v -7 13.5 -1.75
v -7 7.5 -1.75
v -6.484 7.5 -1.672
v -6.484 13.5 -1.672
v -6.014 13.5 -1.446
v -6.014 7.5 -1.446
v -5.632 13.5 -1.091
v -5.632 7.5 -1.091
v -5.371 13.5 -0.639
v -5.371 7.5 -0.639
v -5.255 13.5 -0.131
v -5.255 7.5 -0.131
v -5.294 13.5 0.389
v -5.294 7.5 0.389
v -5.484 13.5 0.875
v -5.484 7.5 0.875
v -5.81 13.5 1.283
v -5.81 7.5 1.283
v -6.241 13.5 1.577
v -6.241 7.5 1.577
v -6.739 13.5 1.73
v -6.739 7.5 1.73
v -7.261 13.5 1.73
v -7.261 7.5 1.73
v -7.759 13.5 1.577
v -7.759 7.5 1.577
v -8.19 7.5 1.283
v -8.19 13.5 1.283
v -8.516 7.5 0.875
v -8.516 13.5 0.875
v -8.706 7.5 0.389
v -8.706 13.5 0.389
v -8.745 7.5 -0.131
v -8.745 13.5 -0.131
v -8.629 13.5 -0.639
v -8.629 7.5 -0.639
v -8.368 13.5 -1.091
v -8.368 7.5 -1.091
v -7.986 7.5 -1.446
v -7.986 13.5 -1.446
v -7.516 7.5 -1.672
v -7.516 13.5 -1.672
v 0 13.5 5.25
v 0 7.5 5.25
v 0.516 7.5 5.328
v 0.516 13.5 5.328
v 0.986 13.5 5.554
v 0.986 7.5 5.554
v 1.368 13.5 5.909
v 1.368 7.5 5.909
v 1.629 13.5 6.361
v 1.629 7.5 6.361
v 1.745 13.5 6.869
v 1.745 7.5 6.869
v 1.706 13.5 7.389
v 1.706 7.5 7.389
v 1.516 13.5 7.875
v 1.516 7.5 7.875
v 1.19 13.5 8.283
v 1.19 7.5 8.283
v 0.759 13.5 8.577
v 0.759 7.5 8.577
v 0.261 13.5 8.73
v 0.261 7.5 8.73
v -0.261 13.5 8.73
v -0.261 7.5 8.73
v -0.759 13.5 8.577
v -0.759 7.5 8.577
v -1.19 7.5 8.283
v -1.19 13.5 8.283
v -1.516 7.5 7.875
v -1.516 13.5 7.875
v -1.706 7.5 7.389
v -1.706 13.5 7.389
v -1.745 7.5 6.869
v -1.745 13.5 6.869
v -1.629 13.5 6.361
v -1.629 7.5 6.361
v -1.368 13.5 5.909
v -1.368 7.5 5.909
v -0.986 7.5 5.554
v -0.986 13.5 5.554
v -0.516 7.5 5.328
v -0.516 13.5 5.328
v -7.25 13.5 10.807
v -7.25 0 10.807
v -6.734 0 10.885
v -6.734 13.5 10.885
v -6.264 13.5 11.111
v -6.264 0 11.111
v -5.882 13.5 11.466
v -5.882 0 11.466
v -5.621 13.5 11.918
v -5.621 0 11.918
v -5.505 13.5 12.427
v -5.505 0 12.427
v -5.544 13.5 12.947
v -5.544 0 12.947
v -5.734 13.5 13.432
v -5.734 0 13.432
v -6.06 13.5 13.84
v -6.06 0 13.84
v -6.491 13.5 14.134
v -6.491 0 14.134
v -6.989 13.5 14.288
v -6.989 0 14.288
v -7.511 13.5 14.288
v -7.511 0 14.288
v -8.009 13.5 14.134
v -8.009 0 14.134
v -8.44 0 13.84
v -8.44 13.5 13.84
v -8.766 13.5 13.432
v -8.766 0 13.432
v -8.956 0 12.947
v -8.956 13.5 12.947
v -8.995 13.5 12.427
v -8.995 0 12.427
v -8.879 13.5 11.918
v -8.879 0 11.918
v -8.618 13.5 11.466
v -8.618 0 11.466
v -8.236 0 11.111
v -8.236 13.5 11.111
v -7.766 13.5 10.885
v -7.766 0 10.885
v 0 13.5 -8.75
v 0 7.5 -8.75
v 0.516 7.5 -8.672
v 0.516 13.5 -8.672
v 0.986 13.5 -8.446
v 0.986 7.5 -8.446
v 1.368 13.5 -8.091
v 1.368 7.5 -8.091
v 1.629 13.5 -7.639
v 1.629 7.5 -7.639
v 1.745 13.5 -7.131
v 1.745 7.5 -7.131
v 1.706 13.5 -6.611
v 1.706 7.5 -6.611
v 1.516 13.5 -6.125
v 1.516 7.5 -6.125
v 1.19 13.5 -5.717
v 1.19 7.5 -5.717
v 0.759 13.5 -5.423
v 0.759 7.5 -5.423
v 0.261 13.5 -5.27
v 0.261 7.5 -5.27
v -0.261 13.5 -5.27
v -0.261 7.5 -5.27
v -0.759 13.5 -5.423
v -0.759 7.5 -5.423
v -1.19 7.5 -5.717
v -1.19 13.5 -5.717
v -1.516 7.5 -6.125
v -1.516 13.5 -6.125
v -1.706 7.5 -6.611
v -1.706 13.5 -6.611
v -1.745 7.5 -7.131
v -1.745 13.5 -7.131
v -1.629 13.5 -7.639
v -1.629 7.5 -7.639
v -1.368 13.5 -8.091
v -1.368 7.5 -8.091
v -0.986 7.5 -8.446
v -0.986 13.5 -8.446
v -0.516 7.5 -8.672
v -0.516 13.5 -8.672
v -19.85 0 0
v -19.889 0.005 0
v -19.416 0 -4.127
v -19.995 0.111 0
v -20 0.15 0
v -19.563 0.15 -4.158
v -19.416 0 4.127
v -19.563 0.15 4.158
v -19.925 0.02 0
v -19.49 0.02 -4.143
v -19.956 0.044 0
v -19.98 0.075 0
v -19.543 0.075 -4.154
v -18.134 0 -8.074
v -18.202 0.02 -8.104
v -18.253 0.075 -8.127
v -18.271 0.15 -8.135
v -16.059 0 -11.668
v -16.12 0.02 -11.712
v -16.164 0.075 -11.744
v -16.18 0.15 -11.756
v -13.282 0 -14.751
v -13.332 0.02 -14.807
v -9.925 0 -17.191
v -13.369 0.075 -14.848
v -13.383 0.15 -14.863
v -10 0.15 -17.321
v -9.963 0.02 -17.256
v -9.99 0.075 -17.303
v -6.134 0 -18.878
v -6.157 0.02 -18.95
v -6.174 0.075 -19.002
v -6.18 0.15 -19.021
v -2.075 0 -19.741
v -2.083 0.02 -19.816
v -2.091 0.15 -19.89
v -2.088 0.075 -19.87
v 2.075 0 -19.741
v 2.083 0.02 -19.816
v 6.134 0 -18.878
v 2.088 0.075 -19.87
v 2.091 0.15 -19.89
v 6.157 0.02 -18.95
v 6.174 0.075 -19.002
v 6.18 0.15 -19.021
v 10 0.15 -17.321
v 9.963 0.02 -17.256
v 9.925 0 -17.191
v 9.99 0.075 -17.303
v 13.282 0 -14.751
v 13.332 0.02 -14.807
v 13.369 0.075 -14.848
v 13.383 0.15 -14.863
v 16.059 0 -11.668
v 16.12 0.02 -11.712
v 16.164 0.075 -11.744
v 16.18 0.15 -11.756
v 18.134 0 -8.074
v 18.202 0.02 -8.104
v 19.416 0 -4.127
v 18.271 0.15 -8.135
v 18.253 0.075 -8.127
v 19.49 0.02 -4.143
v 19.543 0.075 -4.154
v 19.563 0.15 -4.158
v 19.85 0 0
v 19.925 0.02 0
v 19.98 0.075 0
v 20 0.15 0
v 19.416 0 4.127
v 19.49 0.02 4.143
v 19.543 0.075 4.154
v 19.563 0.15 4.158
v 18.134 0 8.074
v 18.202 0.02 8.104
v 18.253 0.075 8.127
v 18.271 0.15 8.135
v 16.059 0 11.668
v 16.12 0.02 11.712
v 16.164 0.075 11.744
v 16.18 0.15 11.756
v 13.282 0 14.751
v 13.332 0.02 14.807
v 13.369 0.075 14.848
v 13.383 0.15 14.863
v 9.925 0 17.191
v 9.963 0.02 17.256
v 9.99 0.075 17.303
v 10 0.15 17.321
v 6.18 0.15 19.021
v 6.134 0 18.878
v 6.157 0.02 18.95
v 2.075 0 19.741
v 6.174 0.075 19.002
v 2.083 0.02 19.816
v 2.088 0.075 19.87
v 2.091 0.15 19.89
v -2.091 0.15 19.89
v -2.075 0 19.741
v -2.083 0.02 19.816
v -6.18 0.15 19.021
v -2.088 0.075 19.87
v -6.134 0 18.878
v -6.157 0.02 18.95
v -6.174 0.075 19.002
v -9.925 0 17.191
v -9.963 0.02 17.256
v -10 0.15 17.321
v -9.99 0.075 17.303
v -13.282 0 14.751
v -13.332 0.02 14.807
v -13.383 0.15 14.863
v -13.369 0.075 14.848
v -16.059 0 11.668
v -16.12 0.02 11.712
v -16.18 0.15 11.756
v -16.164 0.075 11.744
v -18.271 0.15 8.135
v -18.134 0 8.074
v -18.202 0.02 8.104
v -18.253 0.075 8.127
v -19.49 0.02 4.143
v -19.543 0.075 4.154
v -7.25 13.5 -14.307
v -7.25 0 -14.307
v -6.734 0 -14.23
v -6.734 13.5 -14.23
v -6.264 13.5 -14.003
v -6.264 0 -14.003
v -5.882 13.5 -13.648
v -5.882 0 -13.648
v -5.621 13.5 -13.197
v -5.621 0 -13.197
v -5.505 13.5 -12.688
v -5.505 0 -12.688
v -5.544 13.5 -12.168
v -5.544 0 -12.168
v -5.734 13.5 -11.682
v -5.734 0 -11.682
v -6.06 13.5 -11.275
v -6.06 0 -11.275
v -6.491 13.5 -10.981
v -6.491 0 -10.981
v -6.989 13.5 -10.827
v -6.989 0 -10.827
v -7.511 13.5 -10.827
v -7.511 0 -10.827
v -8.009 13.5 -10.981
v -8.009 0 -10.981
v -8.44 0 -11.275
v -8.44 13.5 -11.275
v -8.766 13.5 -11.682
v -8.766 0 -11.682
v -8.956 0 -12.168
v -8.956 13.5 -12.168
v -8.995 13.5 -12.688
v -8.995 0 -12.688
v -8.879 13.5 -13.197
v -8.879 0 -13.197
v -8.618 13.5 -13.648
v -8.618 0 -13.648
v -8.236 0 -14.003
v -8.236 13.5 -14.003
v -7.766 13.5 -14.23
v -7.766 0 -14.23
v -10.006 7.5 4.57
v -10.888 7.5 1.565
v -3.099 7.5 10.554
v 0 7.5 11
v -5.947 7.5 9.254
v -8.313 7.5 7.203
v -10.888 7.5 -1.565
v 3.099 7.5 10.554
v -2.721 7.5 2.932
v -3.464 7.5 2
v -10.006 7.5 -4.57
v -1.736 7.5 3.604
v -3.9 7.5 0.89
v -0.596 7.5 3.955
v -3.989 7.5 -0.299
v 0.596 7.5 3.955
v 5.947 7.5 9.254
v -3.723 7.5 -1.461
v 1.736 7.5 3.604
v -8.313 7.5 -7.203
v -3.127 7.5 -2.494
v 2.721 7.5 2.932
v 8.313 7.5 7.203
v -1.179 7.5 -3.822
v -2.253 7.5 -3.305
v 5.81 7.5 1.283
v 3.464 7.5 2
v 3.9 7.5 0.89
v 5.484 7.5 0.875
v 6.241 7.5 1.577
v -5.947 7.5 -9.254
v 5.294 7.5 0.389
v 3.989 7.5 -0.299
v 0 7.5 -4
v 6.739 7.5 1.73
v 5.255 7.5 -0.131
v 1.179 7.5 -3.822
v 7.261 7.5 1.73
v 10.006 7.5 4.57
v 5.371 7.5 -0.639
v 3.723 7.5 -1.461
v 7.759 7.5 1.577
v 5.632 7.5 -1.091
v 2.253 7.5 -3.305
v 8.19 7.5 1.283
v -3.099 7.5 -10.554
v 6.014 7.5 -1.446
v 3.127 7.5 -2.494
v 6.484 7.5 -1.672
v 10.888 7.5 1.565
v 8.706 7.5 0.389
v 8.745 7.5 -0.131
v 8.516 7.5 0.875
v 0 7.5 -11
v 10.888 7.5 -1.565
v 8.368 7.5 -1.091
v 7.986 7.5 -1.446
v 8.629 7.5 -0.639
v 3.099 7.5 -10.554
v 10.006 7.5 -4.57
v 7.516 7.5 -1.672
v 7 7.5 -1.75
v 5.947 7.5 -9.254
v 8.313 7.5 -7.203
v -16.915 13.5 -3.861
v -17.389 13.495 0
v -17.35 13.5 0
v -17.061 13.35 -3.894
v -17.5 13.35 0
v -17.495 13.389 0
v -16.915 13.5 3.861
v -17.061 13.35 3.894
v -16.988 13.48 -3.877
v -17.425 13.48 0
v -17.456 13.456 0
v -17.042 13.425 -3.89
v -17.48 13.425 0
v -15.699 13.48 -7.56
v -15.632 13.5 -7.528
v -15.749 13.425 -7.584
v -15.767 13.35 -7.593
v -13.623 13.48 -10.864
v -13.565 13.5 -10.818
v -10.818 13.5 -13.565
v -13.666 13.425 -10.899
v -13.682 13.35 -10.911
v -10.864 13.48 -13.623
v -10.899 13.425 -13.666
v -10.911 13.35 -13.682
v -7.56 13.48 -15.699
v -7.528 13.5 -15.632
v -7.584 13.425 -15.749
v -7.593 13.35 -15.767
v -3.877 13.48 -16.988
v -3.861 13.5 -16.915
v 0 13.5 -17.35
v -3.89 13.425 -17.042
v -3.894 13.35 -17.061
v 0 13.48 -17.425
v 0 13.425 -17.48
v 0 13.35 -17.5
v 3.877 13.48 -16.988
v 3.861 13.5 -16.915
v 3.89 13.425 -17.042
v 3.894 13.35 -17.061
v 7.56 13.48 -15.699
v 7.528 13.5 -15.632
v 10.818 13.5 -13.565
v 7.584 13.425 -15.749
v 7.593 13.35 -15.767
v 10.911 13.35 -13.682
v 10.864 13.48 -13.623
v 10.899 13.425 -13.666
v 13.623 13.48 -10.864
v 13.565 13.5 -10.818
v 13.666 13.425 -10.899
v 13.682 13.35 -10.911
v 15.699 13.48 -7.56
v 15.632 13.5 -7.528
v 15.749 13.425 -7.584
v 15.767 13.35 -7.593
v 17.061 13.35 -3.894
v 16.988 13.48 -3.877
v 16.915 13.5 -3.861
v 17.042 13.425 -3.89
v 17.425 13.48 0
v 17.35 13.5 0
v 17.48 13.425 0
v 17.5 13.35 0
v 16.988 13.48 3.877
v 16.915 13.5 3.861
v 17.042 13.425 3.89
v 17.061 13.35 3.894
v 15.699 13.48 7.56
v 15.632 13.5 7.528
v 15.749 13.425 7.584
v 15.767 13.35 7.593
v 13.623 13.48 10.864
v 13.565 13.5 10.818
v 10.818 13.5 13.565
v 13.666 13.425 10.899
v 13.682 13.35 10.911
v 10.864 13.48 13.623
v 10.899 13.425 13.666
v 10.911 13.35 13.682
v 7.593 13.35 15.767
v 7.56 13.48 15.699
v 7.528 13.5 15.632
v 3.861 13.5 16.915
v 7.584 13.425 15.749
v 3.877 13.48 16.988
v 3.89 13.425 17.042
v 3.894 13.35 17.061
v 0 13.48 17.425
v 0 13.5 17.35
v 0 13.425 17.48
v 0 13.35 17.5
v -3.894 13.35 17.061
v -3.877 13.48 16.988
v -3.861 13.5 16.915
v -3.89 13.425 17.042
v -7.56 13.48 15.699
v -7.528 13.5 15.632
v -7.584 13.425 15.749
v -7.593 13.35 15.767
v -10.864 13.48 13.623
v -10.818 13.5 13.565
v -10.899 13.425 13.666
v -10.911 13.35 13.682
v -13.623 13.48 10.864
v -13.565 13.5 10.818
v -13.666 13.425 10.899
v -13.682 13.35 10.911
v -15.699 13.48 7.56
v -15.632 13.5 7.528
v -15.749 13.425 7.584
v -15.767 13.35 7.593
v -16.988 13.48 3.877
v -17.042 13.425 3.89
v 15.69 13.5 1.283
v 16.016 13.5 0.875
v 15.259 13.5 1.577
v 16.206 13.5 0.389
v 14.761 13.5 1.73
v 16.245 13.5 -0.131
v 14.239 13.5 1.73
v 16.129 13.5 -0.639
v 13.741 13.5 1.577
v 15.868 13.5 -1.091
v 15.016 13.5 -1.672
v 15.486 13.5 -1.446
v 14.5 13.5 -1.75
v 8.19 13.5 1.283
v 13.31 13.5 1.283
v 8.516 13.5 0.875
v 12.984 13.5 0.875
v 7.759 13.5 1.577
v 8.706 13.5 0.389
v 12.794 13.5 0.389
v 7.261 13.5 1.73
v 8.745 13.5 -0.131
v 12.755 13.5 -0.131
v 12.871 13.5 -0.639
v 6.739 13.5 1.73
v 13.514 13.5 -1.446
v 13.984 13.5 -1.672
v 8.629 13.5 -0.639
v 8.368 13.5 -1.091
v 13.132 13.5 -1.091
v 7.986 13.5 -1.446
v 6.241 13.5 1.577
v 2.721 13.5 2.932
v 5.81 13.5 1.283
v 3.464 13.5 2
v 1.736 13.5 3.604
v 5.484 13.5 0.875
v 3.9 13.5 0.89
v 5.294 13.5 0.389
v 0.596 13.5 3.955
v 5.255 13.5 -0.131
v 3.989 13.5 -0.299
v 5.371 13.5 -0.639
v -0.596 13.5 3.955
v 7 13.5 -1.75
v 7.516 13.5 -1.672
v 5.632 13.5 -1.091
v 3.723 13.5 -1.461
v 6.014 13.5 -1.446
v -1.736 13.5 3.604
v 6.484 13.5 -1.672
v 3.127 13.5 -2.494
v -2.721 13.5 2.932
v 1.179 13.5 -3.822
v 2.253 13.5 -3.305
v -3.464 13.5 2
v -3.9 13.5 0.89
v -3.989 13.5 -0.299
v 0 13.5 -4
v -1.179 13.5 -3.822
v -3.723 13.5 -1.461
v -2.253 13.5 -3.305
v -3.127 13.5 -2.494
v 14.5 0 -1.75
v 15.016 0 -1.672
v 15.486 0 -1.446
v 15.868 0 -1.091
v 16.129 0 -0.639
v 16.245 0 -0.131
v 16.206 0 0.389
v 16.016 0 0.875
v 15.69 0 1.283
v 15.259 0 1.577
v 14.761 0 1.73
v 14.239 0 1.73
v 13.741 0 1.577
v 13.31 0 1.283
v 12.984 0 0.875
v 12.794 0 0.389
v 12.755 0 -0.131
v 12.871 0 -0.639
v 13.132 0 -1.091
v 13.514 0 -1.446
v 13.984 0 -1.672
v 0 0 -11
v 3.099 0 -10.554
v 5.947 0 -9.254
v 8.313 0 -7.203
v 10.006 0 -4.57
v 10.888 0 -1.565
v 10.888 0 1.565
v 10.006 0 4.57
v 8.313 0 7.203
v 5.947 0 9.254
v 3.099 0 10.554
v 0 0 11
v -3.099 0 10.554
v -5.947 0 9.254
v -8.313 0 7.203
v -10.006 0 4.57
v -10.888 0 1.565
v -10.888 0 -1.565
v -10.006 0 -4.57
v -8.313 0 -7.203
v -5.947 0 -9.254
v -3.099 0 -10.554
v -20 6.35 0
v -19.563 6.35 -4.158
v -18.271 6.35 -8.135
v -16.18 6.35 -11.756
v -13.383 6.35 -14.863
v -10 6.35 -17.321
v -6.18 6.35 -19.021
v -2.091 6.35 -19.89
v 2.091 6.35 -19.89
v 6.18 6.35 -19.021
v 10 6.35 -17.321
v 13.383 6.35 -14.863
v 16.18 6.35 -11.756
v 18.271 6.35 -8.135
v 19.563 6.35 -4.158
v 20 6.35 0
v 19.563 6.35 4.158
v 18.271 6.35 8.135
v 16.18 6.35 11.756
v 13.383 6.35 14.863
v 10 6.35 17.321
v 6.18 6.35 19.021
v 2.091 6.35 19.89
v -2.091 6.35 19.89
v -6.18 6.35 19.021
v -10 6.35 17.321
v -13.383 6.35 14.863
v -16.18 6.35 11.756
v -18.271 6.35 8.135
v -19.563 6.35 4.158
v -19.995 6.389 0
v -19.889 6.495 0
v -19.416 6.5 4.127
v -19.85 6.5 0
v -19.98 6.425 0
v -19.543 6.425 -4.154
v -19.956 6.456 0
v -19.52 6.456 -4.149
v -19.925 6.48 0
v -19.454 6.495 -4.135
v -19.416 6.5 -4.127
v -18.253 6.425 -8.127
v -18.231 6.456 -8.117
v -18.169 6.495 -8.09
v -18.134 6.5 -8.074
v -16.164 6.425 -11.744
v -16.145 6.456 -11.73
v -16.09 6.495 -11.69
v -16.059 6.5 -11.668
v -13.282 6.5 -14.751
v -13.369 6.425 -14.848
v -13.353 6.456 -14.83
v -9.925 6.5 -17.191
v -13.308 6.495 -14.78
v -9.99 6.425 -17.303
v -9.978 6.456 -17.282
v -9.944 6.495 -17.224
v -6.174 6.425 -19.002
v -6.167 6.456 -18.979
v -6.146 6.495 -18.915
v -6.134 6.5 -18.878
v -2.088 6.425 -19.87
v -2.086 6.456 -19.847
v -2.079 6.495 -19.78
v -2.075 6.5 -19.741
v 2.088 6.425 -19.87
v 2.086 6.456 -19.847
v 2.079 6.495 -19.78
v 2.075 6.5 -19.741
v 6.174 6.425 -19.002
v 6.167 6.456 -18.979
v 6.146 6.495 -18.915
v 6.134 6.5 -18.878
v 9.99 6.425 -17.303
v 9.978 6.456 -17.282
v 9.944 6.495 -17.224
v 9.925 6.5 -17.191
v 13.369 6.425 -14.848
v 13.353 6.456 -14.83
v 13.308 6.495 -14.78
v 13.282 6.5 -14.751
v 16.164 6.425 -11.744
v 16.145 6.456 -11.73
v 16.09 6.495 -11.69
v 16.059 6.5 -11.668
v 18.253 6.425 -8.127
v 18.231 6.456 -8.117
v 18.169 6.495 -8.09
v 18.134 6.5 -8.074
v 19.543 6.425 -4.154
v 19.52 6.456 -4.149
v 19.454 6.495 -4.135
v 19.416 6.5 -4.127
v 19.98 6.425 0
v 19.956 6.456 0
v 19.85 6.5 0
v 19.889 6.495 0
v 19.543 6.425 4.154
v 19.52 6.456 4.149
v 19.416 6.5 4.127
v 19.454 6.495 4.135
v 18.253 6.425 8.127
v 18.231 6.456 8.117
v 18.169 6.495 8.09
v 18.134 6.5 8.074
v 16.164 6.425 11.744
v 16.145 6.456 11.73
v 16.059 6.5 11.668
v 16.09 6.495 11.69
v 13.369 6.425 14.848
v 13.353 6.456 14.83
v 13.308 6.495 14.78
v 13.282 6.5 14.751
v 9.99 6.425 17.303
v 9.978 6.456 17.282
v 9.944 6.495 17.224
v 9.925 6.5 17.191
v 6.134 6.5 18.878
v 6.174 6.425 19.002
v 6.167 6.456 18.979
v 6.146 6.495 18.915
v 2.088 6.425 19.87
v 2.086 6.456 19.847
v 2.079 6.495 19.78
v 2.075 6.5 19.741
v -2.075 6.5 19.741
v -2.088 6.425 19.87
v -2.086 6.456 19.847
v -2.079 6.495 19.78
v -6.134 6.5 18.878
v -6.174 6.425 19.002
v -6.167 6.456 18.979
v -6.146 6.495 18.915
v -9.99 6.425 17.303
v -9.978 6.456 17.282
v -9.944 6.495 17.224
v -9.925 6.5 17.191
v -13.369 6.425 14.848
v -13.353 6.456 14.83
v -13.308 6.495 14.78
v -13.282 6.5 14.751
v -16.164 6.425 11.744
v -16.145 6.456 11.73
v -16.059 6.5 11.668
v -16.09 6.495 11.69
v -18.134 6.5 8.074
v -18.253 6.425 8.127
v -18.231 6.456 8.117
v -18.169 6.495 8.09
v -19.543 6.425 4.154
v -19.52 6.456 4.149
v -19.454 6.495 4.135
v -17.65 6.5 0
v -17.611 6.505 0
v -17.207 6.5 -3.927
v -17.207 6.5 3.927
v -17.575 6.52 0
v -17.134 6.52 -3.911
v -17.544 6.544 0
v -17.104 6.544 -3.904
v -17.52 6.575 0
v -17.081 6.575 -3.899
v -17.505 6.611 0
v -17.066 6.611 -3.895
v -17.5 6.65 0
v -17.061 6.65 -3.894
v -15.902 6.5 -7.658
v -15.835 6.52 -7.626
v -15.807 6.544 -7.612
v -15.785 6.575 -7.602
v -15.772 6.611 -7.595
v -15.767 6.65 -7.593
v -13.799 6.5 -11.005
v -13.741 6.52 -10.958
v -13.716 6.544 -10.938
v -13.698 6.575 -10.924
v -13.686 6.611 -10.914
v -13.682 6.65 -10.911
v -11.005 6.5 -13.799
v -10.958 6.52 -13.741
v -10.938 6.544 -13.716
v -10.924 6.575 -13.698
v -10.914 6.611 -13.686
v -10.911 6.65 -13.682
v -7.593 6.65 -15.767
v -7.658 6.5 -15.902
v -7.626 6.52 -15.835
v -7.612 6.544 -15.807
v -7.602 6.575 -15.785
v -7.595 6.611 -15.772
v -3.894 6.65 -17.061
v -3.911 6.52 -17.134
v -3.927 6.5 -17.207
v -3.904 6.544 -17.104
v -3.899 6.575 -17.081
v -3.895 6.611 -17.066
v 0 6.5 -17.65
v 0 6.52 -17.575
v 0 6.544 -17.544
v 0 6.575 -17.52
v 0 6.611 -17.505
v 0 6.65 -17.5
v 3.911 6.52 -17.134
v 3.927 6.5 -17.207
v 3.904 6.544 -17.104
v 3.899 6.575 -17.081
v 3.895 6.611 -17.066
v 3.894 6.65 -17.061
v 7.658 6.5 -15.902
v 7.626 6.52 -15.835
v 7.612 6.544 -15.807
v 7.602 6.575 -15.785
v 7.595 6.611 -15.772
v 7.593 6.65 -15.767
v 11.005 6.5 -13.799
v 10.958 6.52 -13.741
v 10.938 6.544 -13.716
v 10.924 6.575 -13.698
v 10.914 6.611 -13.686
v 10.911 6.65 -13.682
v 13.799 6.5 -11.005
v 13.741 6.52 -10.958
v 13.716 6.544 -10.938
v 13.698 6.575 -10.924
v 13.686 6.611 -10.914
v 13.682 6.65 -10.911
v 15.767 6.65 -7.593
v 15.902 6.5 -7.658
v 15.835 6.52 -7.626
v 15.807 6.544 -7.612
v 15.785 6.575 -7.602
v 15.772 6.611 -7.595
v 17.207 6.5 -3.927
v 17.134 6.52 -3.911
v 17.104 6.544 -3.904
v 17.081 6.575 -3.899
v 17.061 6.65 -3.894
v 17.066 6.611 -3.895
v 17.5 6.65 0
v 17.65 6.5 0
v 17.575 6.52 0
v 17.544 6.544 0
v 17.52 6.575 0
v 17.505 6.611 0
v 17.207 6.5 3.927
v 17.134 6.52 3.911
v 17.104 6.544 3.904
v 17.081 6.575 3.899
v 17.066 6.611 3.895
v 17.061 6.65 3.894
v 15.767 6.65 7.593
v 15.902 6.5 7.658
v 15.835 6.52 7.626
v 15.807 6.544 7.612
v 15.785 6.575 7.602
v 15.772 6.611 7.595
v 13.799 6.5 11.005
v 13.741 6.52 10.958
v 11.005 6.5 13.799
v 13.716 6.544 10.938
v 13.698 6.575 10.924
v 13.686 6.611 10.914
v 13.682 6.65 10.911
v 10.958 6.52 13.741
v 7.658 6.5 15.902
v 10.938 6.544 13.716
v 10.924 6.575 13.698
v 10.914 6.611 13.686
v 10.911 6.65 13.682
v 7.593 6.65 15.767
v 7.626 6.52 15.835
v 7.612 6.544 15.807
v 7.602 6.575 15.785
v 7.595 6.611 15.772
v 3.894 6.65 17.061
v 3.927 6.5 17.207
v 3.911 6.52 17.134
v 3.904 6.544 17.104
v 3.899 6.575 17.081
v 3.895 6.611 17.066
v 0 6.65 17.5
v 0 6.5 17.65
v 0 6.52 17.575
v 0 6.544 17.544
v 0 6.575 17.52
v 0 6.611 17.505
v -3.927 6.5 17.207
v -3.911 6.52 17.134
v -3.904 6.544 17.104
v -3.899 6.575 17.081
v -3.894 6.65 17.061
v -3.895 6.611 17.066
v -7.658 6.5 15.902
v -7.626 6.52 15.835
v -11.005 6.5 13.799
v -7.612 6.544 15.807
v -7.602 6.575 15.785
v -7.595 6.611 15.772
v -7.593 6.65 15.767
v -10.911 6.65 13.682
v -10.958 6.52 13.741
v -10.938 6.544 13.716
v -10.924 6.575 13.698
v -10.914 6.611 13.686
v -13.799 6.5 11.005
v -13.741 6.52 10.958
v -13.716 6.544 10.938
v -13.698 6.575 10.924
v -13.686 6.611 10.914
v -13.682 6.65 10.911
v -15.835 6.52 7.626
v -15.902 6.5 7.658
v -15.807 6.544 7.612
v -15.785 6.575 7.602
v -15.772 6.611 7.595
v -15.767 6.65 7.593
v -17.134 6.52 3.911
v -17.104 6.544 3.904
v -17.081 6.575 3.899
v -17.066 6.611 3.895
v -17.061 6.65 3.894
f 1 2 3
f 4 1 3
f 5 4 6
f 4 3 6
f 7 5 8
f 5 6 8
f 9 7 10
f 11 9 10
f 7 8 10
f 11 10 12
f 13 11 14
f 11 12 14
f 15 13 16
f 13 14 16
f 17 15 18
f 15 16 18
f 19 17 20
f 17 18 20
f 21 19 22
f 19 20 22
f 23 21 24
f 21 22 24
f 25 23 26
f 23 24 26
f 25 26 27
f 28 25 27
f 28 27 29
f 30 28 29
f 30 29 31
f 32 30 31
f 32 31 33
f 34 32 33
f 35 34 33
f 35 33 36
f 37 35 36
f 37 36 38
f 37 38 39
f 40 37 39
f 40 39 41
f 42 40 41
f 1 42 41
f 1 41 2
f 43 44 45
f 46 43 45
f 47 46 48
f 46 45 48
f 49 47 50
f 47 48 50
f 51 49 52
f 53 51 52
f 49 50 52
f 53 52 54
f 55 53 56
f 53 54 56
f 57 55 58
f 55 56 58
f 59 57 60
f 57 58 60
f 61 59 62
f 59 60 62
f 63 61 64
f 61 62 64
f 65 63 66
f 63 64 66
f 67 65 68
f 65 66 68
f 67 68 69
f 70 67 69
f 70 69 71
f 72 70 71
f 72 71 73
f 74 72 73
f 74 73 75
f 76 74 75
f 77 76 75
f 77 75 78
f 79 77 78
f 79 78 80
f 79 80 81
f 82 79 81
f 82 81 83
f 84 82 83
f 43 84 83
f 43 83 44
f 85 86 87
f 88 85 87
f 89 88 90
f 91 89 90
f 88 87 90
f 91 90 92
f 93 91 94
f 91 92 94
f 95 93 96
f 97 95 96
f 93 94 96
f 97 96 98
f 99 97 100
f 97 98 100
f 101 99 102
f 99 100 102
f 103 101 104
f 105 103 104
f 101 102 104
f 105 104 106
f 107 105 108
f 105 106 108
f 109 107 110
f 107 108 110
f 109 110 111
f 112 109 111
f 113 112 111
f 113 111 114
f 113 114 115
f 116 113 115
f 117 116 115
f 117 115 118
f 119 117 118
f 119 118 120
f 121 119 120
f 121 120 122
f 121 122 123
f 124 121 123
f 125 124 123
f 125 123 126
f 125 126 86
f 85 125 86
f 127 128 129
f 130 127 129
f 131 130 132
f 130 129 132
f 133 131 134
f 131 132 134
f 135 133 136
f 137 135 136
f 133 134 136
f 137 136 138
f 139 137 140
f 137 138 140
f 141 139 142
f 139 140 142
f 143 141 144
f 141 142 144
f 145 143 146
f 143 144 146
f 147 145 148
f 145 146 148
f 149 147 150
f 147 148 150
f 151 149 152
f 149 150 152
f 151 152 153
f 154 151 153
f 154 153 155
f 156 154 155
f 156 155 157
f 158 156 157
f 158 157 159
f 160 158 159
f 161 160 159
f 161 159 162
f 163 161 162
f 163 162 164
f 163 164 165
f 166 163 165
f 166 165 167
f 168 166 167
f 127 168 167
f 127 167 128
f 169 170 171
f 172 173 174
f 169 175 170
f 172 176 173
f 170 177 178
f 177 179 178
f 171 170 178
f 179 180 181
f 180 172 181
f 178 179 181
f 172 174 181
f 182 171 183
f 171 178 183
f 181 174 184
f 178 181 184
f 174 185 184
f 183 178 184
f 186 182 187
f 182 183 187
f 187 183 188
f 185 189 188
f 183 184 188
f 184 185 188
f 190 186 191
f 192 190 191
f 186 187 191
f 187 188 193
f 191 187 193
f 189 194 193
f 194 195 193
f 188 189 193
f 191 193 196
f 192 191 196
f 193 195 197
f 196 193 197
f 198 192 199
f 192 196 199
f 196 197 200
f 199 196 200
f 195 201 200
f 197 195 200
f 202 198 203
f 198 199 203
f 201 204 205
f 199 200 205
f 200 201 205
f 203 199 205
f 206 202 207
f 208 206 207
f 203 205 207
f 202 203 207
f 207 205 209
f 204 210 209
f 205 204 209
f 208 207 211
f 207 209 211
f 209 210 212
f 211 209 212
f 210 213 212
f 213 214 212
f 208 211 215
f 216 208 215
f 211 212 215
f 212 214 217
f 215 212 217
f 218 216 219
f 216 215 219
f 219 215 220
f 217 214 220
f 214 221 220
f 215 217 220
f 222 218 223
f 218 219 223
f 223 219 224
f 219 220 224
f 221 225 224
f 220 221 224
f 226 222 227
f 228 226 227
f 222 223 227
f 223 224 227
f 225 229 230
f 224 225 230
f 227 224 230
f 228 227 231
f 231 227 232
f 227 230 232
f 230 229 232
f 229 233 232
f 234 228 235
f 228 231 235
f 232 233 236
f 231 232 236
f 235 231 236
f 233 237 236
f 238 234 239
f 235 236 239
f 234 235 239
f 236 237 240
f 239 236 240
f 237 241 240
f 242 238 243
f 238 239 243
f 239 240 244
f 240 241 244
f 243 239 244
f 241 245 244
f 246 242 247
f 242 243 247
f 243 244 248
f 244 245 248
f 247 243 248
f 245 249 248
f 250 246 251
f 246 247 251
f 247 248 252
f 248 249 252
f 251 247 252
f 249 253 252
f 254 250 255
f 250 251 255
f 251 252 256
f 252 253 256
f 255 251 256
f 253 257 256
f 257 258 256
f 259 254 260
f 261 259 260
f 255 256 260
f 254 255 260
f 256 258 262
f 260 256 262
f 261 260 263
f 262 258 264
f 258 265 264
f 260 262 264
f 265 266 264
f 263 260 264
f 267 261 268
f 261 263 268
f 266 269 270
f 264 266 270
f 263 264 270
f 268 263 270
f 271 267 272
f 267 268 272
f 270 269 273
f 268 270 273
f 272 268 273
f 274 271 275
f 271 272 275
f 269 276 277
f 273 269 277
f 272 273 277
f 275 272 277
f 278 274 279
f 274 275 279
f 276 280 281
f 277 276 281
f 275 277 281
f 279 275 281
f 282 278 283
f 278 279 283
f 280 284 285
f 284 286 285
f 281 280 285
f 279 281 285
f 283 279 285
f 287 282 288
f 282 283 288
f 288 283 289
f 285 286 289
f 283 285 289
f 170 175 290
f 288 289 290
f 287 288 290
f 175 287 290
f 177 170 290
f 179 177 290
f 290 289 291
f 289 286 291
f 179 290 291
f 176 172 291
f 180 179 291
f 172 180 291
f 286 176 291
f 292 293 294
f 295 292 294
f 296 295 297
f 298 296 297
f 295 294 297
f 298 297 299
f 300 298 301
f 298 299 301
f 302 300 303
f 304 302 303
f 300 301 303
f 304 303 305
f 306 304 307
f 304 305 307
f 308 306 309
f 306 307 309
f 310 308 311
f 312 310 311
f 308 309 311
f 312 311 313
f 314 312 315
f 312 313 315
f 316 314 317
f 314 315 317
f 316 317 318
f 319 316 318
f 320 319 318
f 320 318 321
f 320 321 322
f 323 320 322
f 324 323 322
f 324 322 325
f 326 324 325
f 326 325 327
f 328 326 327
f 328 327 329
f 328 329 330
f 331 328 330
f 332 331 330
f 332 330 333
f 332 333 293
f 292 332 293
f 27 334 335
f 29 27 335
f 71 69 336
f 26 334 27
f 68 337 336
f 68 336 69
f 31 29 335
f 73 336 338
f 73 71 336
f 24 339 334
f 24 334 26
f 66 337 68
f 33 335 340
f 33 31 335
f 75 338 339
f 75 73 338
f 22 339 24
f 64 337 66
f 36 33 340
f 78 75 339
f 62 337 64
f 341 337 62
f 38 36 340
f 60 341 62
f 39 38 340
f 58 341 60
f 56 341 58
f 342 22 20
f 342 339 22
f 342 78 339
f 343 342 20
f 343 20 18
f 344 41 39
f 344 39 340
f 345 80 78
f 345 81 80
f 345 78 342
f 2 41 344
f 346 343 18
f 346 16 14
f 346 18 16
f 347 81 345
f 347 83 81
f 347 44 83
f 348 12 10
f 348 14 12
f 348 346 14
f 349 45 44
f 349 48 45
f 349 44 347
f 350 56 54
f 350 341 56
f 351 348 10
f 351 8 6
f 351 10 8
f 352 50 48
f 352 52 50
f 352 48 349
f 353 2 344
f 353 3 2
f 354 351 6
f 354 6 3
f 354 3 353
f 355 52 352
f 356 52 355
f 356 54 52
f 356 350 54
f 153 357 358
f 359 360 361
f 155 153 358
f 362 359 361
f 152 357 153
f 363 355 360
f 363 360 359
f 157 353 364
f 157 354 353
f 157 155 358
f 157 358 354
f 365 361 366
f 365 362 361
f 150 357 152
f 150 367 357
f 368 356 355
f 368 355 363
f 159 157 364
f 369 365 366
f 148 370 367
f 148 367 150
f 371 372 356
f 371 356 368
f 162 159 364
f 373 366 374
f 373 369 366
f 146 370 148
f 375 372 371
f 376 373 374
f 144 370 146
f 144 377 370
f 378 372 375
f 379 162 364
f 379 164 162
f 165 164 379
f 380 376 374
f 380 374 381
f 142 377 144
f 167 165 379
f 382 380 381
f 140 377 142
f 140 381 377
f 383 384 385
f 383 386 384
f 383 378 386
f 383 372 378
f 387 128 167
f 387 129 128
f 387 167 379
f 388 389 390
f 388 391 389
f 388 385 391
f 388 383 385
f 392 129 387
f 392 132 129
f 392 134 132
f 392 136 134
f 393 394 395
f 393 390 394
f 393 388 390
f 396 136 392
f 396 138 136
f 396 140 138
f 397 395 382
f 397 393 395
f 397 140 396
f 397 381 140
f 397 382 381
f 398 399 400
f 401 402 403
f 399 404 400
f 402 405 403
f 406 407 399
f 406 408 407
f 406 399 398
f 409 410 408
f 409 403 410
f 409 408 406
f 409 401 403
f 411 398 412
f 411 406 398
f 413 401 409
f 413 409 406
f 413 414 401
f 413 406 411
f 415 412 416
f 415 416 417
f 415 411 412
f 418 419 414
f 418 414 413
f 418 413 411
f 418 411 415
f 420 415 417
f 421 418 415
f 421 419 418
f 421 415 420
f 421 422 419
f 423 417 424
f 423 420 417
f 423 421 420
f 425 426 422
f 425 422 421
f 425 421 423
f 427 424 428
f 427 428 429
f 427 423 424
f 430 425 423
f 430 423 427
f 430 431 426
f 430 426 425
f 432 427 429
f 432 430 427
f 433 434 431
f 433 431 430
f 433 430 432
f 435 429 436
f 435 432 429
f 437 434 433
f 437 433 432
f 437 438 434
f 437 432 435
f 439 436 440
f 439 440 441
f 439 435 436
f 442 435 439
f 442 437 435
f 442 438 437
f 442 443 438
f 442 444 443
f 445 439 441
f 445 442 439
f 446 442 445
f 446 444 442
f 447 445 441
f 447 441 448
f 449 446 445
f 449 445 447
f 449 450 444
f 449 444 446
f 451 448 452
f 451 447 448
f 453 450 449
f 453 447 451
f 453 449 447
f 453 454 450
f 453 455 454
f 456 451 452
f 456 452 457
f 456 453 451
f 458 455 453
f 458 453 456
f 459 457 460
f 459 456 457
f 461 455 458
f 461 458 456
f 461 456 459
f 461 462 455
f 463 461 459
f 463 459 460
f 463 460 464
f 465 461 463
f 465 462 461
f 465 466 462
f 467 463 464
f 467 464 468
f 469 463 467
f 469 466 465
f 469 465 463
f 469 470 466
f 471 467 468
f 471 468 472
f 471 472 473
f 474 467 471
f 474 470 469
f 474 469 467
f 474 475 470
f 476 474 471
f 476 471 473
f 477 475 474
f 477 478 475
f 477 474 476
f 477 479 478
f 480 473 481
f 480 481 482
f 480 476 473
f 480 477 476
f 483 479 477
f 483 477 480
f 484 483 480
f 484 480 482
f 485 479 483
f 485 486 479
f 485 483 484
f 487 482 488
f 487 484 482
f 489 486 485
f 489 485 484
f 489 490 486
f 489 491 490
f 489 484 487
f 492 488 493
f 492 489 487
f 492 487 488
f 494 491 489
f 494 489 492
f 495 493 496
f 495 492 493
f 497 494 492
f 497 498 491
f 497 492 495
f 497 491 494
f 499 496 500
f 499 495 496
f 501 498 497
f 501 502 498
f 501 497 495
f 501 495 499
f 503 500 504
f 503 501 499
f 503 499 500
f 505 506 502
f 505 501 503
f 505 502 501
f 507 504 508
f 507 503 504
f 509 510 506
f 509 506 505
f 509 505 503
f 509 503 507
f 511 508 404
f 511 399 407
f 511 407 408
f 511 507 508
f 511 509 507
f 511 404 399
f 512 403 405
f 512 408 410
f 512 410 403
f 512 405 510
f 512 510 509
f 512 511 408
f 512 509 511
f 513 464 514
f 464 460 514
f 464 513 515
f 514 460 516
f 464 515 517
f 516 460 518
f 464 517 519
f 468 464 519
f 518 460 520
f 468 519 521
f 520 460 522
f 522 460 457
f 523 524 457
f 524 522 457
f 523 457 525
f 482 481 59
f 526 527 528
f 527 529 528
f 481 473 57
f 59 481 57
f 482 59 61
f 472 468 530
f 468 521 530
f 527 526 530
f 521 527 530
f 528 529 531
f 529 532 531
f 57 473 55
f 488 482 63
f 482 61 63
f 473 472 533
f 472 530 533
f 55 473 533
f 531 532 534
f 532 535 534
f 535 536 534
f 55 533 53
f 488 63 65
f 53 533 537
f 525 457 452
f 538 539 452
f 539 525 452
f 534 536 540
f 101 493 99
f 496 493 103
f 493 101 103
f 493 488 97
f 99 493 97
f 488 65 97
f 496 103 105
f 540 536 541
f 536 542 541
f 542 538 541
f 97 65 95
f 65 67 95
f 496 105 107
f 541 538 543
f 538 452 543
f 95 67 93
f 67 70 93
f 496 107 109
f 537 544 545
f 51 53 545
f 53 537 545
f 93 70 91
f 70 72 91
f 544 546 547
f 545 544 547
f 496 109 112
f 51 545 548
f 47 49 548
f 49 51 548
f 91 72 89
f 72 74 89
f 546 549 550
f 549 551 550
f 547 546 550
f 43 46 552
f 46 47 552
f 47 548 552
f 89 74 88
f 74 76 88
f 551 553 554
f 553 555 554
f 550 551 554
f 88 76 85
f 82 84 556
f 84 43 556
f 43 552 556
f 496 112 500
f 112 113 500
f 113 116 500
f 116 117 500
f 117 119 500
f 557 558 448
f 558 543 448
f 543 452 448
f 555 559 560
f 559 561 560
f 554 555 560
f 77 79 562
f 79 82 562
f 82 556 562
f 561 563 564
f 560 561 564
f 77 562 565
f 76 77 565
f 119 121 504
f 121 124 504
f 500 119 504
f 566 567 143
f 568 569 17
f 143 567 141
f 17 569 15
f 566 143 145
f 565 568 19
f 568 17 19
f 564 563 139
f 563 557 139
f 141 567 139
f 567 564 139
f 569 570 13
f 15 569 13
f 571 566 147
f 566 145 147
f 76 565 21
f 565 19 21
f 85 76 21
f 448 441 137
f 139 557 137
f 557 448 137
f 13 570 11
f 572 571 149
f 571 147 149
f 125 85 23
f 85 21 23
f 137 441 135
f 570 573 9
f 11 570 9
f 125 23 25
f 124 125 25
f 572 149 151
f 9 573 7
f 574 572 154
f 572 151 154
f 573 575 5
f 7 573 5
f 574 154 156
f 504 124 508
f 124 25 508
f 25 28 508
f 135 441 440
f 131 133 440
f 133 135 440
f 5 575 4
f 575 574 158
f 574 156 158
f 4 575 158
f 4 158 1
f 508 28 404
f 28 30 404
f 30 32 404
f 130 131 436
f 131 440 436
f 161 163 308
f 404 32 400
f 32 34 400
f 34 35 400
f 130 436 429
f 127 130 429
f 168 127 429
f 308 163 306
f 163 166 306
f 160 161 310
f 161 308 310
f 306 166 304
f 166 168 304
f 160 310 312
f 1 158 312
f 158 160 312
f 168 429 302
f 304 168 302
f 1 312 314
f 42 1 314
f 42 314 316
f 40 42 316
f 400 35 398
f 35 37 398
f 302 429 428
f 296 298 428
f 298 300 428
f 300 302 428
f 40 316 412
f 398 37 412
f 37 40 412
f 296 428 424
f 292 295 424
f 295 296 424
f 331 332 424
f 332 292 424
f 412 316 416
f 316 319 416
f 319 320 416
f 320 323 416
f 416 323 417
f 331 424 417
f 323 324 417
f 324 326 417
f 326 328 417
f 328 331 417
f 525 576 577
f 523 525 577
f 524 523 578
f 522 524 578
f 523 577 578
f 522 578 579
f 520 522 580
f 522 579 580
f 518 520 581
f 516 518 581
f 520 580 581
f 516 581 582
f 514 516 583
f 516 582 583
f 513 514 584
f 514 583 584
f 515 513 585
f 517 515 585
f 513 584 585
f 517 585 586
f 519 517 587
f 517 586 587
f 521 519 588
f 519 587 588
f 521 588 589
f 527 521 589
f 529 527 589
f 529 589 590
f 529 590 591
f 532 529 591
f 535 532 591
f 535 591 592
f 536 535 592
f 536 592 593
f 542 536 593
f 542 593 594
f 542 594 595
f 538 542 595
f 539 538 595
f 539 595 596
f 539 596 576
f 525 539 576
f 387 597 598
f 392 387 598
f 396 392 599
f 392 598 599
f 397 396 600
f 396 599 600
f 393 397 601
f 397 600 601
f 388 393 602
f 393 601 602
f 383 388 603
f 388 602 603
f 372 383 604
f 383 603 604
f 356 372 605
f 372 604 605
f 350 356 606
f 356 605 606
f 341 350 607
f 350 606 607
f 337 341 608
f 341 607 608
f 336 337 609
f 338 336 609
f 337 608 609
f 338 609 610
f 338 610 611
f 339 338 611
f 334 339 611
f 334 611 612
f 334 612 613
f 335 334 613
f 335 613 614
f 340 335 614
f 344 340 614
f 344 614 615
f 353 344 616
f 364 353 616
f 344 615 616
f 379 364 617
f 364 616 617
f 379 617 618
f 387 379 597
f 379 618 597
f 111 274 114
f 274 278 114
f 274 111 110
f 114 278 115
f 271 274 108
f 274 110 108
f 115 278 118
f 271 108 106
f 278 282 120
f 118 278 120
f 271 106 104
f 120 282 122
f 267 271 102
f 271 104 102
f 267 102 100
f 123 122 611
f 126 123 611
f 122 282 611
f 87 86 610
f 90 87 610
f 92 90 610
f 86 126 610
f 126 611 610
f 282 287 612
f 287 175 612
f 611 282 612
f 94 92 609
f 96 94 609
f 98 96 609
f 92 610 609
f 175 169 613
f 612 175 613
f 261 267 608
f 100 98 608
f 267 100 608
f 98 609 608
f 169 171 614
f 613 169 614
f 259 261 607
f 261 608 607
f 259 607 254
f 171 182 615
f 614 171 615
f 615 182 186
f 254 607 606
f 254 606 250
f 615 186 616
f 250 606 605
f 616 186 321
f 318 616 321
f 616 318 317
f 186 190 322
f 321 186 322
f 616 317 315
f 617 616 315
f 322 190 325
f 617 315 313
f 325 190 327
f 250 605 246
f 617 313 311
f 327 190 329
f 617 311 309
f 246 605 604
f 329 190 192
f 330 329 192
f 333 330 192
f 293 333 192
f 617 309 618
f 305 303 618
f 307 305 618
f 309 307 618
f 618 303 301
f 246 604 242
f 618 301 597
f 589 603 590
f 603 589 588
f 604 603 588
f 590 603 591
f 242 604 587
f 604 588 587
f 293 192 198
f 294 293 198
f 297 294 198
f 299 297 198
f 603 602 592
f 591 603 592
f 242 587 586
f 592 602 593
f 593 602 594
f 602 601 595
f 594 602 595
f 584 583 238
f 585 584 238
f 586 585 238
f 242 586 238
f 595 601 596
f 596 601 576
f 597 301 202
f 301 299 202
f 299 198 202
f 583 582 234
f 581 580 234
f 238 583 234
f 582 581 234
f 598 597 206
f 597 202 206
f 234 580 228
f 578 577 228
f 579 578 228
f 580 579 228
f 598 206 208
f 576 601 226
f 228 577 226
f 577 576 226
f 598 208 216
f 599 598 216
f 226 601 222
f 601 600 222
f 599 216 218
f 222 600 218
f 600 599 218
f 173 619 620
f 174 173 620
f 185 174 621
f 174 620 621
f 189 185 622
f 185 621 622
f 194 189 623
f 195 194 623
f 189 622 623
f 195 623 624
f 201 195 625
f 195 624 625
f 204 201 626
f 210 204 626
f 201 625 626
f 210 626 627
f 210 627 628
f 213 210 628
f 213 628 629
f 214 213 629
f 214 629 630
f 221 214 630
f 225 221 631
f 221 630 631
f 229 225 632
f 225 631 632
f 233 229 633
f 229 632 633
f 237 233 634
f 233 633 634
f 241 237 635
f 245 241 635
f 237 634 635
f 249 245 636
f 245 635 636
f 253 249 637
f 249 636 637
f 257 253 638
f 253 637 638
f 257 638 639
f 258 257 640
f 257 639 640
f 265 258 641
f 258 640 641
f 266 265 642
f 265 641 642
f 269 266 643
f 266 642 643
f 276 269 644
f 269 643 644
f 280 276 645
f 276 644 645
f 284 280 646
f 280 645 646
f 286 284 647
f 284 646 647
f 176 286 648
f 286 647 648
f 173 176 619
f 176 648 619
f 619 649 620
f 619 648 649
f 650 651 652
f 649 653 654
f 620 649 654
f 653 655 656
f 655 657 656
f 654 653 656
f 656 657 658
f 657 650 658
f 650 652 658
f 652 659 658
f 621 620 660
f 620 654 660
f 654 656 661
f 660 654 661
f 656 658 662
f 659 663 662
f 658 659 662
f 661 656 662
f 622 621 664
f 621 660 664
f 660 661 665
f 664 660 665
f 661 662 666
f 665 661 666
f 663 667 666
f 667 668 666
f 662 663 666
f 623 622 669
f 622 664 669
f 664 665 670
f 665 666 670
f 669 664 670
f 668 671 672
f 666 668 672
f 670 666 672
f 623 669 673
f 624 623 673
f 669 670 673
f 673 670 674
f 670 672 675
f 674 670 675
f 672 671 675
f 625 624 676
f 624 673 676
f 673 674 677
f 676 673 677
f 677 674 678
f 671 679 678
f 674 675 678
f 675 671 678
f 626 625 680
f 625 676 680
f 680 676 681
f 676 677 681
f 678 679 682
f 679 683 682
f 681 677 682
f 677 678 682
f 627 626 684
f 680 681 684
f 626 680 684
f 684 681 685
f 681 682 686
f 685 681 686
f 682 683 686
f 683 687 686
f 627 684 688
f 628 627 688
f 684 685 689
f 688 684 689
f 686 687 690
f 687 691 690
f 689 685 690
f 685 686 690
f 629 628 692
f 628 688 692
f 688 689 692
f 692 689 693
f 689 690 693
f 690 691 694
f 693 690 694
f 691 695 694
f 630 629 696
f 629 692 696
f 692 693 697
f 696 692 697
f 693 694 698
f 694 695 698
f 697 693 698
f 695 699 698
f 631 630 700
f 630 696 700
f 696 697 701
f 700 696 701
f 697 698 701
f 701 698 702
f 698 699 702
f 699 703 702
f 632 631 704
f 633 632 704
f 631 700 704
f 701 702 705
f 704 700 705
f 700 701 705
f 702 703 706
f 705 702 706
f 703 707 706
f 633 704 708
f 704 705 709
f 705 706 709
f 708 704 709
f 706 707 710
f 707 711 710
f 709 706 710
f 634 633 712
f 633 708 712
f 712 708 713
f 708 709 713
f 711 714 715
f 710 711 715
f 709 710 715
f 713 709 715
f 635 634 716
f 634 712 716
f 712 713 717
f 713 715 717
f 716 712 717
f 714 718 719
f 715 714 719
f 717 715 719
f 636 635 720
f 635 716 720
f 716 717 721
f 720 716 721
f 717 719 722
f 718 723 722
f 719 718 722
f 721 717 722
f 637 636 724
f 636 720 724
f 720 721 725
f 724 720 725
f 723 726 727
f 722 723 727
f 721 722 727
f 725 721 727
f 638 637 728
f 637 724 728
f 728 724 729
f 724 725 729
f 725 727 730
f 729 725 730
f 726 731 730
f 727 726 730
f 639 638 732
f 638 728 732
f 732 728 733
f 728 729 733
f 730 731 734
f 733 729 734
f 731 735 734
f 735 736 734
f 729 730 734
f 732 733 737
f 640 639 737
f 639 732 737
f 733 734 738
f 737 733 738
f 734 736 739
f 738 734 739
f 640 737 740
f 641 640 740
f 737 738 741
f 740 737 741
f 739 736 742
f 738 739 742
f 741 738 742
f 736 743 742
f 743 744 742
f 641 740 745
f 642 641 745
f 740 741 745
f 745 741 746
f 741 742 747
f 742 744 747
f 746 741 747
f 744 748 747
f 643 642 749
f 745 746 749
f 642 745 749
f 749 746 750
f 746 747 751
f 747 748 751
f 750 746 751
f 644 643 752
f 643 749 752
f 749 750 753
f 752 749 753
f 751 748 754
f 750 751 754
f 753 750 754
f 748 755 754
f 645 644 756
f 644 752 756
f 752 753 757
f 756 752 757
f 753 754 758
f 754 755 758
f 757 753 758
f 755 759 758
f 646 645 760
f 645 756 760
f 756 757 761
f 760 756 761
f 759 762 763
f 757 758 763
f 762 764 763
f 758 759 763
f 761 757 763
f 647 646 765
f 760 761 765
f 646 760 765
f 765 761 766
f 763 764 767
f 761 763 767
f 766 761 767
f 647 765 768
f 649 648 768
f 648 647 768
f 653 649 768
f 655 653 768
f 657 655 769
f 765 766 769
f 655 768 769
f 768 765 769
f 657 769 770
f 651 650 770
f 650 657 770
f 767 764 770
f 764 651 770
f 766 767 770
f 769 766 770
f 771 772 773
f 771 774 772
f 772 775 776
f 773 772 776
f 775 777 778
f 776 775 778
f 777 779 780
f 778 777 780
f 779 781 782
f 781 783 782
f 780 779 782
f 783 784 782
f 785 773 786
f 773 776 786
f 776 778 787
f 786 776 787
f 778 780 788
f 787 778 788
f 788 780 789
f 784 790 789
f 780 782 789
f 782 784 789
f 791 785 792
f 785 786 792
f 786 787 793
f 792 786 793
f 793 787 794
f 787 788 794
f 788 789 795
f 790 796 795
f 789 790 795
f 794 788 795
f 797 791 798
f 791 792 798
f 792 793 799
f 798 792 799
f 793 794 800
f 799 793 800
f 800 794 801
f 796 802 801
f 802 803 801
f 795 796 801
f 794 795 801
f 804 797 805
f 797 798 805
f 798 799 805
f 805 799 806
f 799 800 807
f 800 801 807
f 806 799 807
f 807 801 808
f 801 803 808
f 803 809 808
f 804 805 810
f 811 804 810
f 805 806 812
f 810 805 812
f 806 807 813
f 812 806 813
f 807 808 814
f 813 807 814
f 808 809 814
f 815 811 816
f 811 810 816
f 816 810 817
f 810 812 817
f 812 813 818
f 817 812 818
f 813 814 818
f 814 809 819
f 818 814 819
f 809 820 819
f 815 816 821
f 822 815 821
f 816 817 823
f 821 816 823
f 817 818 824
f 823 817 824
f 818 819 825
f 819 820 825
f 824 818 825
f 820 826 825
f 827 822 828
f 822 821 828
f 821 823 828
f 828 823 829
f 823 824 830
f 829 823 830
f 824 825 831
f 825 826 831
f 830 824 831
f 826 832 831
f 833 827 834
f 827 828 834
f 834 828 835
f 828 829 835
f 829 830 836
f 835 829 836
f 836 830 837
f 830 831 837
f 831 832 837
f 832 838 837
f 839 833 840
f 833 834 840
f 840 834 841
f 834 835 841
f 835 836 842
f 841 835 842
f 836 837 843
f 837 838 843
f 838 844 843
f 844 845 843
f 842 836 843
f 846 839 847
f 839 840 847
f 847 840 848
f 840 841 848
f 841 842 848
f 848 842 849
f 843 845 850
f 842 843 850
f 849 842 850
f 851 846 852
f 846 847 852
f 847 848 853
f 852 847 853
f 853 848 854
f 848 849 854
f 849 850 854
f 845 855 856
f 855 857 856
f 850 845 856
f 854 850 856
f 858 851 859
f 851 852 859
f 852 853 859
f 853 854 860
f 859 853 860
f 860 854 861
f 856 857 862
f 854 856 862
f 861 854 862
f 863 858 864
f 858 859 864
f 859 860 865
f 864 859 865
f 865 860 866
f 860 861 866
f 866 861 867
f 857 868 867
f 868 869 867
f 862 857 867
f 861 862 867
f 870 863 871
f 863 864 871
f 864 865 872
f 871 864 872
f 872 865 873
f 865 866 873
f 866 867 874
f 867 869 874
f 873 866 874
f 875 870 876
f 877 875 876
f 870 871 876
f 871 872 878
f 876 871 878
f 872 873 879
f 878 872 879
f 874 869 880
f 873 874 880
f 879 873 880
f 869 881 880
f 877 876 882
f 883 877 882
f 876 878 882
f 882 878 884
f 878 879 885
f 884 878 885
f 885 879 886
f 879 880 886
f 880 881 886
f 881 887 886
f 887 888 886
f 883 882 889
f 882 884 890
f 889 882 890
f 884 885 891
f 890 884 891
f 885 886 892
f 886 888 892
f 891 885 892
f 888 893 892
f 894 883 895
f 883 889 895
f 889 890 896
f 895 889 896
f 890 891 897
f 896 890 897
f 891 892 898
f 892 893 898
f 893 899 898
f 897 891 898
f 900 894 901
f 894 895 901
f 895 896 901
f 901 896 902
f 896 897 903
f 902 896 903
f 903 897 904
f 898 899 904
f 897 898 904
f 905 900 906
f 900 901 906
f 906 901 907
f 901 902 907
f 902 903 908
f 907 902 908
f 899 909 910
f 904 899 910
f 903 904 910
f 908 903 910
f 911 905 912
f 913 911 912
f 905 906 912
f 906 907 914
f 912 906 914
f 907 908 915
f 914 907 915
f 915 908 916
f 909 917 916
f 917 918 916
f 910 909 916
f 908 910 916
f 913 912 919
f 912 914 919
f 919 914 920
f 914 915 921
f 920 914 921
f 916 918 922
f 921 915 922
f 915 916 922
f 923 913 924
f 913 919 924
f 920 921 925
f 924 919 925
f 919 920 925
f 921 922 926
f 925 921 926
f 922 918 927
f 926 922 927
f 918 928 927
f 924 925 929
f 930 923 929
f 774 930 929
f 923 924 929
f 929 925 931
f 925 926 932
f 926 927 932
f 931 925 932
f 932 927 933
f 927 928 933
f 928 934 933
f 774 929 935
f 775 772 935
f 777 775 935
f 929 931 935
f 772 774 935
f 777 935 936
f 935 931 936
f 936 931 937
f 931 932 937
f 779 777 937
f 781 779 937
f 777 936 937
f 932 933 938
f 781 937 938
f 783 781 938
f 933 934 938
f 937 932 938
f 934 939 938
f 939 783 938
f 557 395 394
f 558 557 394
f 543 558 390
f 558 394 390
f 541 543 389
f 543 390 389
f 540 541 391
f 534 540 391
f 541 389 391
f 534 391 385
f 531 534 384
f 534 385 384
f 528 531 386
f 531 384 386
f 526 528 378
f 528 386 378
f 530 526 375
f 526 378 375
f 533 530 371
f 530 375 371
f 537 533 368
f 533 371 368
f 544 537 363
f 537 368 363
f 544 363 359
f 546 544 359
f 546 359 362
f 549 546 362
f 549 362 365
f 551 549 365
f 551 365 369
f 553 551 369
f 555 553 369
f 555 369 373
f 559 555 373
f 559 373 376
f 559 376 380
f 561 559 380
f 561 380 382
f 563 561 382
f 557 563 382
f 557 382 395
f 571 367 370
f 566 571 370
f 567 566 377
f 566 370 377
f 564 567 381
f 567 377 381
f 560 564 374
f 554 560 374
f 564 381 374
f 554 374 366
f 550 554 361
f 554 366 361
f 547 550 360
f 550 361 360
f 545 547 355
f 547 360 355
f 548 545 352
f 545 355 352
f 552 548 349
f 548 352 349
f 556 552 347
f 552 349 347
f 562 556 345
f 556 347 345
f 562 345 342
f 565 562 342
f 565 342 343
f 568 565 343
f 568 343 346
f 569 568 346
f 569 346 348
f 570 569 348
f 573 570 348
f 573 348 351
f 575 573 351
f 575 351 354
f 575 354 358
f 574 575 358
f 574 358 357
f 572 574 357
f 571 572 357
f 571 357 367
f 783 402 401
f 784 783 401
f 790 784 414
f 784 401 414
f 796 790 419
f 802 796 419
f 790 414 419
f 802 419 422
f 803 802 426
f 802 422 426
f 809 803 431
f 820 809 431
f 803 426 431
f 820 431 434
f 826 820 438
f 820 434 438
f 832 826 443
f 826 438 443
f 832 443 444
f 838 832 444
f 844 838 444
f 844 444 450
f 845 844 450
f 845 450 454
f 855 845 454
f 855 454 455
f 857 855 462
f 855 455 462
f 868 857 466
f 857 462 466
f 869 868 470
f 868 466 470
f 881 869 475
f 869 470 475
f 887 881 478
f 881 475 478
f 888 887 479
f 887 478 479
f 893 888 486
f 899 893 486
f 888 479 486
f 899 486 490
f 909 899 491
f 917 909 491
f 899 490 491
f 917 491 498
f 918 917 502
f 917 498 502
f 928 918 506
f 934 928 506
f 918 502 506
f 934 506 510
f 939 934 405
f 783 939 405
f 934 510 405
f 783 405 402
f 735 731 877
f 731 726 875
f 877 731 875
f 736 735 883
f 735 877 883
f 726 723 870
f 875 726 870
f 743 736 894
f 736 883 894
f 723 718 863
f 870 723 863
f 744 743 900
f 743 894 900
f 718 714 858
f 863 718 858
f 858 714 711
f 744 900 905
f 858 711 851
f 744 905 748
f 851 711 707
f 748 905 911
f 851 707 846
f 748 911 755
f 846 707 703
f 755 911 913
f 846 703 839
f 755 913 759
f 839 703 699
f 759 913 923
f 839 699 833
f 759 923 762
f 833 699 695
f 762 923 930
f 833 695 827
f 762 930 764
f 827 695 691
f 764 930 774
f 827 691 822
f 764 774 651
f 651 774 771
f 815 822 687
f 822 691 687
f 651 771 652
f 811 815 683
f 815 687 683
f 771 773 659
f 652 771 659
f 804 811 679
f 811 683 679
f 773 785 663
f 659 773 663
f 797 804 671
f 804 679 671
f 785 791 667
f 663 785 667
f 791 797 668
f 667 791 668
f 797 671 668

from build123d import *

# Parameters (mm, degrees)
SKETCH2_R          = 1.75
SKETCH2_R_2        = 4
CUT_EXTRUDE4_DEPTH = 32.340867888
SKETCH7_R          = 11
CUT_EXTRUDE5_DEPTH = 7.5
FILLET1_R          = 0.15


with BuildPart() as part:
    # Sketch1 → Revolve1 (revolve)
    with BuildSketch(Plane.XY):
        Polygon((0, 0), (-20, 0), (-20, 6.5), (-17.5, 6.5), (-17.5, 13.5), (0, 13.5), align=None)
    revolve(axis=Axis((0, 13.5, 0), (0, -1, 0)))

    # Sketch2 → Cut-Extrude4 (cut, through all)
    with BuildSketch(Plane.XZ):
        with Locations(Location((-7.25, 12.557368355, 0), (0, 0, 270))):
            Circle(SKETCH2_R)
        with Locations(Location((-7.25, -12.557368355, 0), (0, 0, 270))):
            Circle(SKETCH2_R)
        with Locations(Location((14.5, 0, 0), (0, 0, 270))):
            Circle(SKETCH2_R)
        with Locations(Location((7, 0, 0), (0, 0, 270))):
            Circle(SKETCH2_R)
        with Locations(Location((0, -7, 0), (0, 0, 270))):
            Circle(SKETCH2_R)
        with Locations(Location((-7, 0, 0), (0, 0, 270))):
            Circle(SKETCH2_R)
        with Locations(Location((0, 7, 0), (0, 0, 270))):
            Circle(SKETCH2_R)
        with Locations(Location((0, 0, 0), (0, 0, 270))):
            Circle(SKETCH2_R_2)
    extrude(amount=-CUT_EXTRUDE4_DEPTH, mode=Mode.SUBTRACT)

    # Sketch7 → Cut-Extrude5 (cut)
    with BuildSketch(Plane.XZ):
        with Locations(Location((0, 0, 0), (0, 0, 270))):
            Circle(SKETCH7_R)
    extrude(amount=-CUT_EXTRUDE5_DEPTH, mode=Mode.SUBTRACT)

    # Fillet1
    fillet1_edges = [part.edges().sort_by_distance(p)[0] for p in [
        (17.5, 13.5, 0),
        (17.5, 6.5, 0),
        (20, 6.5, 0),
        (20, 0, 0),
    ]]
    fillet(fillet1_edges, radius=FILLET1_R)


solid = part.part
